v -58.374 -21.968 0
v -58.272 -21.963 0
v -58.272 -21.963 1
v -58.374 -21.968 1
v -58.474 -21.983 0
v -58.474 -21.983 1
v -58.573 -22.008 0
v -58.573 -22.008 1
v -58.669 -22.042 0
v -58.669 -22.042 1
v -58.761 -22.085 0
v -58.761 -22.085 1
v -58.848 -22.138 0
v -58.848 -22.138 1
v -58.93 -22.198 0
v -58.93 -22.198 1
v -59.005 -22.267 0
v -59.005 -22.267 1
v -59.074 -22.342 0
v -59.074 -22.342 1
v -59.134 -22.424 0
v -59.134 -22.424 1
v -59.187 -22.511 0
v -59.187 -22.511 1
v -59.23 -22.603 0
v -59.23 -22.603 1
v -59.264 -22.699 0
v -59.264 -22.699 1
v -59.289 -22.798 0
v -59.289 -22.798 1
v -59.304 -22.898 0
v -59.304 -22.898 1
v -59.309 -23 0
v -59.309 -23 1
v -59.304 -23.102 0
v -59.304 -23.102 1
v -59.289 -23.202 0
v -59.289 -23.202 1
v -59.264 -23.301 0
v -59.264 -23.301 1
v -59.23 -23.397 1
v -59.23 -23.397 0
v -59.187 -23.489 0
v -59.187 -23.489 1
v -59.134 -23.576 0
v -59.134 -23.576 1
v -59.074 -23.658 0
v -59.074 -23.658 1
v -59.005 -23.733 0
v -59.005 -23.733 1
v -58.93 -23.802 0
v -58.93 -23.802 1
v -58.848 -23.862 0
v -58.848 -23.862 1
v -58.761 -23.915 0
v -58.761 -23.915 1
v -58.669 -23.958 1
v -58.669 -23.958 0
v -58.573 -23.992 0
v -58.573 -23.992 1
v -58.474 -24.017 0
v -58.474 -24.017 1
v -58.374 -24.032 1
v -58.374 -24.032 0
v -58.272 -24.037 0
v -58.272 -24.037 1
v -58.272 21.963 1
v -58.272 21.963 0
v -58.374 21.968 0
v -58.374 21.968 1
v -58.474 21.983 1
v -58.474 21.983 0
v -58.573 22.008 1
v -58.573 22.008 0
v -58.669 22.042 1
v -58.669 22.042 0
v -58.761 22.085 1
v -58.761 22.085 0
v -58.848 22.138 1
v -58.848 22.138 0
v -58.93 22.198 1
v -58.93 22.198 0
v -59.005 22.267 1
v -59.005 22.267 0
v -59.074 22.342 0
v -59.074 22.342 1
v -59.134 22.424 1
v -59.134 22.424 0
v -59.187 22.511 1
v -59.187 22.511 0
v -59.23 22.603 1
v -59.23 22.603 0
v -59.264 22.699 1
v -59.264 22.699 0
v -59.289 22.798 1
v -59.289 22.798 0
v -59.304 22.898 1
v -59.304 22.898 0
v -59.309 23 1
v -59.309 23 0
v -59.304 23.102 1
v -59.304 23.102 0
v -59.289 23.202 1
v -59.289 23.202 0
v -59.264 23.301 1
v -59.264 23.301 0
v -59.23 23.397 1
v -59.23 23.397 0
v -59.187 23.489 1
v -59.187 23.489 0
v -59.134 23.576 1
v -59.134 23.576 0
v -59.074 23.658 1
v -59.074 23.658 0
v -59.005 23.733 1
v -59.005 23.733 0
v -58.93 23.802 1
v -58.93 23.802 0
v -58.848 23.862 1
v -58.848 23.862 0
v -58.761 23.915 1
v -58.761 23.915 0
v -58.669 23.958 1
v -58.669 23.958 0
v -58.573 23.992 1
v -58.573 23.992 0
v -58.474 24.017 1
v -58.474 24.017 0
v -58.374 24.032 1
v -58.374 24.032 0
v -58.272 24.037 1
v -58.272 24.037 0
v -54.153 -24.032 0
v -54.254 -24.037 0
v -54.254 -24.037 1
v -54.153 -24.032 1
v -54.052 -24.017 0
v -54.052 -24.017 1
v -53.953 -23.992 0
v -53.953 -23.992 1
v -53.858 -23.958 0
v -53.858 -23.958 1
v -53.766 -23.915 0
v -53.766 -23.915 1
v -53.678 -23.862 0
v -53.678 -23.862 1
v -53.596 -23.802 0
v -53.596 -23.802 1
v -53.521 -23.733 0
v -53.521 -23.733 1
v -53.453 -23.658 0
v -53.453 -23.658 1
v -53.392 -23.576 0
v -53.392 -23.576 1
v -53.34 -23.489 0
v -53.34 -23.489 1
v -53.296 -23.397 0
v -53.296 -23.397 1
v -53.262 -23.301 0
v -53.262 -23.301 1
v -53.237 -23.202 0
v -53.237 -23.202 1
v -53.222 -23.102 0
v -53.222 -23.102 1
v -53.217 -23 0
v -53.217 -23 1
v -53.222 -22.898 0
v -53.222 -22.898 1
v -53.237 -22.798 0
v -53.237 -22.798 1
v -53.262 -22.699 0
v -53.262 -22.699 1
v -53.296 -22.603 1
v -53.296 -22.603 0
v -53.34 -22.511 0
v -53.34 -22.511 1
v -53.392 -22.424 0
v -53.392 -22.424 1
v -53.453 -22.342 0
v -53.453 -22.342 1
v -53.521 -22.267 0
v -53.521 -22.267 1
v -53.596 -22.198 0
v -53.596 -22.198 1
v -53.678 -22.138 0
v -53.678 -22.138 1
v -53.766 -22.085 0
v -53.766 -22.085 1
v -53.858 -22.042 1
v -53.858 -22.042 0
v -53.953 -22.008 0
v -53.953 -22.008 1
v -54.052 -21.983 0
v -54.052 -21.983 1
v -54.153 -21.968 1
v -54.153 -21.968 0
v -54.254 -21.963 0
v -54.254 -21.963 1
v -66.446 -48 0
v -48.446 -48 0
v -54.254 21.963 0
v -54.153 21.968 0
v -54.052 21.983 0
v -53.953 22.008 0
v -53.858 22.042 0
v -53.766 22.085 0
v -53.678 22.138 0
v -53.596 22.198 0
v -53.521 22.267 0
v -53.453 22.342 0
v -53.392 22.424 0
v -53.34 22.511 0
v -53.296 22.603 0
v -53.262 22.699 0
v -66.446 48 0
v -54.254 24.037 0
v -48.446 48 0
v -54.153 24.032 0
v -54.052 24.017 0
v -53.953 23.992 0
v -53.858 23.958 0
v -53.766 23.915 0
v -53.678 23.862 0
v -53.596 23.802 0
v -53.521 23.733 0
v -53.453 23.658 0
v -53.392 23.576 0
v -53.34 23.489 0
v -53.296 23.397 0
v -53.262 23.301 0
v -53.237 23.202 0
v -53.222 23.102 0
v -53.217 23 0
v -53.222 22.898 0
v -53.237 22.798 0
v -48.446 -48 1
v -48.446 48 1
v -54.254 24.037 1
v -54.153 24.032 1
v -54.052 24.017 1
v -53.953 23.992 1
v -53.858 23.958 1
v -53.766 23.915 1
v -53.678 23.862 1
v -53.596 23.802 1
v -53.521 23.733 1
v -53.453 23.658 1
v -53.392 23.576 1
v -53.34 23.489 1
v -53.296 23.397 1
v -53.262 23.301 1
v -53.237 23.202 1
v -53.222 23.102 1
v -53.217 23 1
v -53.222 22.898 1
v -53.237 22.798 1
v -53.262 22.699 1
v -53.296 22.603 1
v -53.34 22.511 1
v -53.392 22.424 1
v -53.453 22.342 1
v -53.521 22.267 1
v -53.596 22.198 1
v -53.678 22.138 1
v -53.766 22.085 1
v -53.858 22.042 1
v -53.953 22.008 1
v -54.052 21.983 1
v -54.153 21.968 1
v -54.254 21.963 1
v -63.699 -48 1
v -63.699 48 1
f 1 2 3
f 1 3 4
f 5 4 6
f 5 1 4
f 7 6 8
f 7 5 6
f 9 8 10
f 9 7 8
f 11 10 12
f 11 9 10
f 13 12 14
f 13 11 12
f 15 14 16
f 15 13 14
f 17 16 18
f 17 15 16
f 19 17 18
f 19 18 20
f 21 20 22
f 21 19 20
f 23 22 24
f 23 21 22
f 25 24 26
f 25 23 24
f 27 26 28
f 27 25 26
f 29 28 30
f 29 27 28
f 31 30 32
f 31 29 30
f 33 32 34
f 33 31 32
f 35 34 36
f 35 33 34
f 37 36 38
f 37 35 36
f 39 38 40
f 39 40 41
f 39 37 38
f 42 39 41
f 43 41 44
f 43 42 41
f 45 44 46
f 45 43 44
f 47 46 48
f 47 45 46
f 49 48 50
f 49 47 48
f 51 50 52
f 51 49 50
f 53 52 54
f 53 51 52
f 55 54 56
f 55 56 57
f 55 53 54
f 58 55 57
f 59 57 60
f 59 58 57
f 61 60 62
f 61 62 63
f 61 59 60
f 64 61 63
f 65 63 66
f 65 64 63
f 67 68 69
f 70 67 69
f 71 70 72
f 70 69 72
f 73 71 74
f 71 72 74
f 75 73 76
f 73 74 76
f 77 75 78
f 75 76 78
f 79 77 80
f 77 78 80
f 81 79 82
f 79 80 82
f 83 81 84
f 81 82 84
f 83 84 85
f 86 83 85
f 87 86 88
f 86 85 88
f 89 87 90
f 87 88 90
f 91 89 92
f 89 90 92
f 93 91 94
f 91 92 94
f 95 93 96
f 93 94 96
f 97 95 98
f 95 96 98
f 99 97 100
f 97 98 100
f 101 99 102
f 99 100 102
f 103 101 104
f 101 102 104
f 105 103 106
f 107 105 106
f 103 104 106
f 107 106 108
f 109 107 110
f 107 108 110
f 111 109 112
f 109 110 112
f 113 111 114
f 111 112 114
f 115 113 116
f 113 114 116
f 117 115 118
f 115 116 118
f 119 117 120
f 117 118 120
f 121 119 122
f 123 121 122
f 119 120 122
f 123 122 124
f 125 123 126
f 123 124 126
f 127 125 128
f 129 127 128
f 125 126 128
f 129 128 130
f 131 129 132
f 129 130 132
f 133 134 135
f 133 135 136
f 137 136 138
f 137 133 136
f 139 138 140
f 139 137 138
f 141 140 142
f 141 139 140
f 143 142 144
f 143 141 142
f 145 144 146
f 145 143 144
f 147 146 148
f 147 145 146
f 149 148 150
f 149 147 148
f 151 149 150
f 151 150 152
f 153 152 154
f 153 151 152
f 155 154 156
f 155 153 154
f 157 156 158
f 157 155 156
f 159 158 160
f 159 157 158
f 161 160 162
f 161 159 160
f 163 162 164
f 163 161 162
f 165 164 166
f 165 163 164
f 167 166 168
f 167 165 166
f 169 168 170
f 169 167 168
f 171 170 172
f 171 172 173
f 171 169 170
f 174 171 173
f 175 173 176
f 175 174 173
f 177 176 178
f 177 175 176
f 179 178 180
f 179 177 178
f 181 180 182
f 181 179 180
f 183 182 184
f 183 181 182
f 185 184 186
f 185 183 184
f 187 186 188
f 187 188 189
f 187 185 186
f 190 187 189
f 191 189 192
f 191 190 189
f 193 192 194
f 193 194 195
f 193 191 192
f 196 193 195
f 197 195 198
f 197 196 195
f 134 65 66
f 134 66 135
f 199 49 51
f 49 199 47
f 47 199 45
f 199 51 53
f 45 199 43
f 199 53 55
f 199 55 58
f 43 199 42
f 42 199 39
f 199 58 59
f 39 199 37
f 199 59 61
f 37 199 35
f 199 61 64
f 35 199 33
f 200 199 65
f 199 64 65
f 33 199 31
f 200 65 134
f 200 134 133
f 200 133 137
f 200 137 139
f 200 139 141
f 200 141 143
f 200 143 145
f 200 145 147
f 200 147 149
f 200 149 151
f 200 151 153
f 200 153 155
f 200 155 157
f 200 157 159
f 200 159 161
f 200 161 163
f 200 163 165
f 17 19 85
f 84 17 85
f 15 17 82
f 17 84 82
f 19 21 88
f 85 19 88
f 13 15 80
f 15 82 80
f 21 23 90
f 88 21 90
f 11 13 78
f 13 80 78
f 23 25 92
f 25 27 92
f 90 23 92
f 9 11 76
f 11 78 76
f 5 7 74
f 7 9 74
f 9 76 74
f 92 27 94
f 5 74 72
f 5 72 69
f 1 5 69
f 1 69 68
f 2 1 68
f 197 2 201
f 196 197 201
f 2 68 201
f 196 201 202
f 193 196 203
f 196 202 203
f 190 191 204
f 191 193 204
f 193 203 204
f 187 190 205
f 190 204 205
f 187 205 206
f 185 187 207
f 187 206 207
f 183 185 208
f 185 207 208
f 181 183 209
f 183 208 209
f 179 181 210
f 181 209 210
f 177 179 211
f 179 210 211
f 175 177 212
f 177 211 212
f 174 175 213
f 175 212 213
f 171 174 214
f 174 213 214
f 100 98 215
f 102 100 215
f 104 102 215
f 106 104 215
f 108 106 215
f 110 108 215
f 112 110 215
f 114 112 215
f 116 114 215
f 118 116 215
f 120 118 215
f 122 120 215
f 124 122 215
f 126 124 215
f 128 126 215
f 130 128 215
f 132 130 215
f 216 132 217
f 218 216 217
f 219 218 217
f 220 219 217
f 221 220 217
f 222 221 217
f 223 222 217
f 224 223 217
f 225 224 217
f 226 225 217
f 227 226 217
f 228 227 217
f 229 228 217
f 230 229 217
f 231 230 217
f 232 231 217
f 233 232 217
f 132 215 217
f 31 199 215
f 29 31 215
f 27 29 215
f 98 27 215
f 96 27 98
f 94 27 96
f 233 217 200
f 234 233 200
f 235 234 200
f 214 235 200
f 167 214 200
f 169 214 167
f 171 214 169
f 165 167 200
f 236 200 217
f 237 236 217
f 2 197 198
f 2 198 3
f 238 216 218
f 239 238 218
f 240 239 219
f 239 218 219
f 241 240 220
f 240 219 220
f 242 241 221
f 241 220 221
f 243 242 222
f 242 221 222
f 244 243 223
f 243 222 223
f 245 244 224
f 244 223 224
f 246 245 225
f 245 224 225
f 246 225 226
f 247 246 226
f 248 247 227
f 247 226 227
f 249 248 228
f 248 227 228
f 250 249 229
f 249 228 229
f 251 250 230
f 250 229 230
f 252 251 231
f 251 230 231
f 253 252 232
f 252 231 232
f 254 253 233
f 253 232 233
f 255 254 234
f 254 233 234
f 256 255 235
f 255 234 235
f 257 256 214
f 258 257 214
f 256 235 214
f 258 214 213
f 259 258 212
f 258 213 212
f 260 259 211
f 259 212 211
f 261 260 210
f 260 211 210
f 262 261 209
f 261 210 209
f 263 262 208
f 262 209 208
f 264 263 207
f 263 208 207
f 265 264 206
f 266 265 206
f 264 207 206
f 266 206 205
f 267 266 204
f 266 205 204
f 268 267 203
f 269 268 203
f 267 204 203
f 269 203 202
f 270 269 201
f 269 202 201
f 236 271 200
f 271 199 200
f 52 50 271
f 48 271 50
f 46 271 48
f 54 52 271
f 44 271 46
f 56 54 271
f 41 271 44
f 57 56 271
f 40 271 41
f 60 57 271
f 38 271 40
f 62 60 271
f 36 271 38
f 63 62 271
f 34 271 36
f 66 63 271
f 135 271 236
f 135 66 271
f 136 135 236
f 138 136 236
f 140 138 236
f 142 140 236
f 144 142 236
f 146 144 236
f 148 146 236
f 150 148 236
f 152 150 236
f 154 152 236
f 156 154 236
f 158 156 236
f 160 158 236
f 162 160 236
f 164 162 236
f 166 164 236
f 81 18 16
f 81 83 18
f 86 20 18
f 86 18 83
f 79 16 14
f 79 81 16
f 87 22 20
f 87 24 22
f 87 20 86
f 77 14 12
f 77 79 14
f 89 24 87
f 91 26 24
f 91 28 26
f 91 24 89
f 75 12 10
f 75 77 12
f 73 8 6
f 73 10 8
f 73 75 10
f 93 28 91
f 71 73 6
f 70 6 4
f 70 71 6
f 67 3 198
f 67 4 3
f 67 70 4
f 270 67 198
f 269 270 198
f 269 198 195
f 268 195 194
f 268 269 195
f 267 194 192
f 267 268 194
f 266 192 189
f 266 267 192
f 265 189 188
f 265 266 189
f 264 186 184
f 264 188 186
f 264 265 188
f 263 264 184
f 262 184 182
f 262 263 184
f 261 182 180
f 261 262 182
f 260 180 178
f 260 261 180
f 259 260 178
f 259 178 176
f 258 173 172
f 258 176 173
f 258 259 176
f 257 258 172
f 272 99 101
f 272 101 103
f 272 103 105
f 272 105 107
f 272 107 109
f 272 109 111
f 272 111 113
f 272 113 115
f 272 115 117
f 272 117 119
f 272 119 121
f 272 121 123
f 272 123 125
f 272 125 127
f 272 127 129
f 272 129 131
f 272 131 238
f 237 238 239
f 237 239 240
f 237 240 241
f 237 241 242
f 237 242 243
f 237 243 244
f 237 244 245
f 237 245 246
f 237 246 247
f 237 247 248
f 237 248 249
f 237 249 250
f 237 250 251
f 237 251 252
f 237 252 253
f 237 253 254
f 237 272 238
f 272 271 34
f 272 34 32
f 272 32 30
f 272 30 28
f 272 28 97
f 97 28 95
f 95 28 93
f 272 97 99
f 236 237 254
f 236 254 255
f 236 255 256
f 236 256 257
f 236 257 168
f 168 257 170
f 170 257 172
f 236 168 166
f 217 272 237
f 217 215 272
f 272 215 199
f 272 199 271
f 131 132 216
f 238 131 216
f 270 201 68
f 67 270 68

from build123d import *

# Parameters (mm, degrees)
SKETCH_1_W          = 18
SKETCH_1_H          = 96
EXTRUDE_1_DEPTH     = 1
CUT_EXTRUDE_1_DEPTH = 117.756631965


with BuildPart() as part:
    # Эскиз1 → Бобышка-Вытянуть1 (new body)
    with BuildSketch(Plane.XY):
        with Locations((-57.446302439, 0)):
            Rectangle(SKETCH_1_W, SKETCH_1_H)
        with BuildLine():
            Line((-54.254431019, 21.962877229), (-58.271972276, 21.962877229))
            ThreePointArc((-58.271972276, 21.962877229), (-59.309095047, 23), (-58.271972276, 24.037122771))
            Line((-58.271972276, 24.037122771), (-54.254431019, 24.037122771))
            ThreePointArc((-54.254431019, 24.037122771), (-53.217308248, 23), (-54.254431019, 21.962877229))
        make_face(mode=Mode.SUBTRACT)
        with BuildLine():
            Line((-54.254431019, -21.962877229), (-58.271972276, -21.962877229))
            ThreePointArc((-58.271972276, -21.962877229), (-59.309095047, -23), (-58.271972276, -24.037122771))
            Line((-58.271972276, -24.037122771), (-54.254431019, -24.037122771))
            ThreePointArc((-54.254431019, -24.037122771), (-53.217308248, -23), (-54.254431019, -21.962877229))
        make_face(mode=Mode.SUBTRACT)
    extrude(amount=EXTRUDE_1_DEPTH)

    # Эскиз2 → Вырез-Вытянуть1 (cut, through all)
    with BuildSketch(Plane(origin=(0, 48, 0), x_dir=(1, 0, 0), z_dir=(0, 1, 0))):
        Polygon((-66.446302439, 0), (-63.698825019, -1), (-66.446302439, -1), align=None)
    extrude(amount=-CUT_EXTRUDE_1_DEPTH, mode=Mode.SUBTRACT)


solid = part.part
